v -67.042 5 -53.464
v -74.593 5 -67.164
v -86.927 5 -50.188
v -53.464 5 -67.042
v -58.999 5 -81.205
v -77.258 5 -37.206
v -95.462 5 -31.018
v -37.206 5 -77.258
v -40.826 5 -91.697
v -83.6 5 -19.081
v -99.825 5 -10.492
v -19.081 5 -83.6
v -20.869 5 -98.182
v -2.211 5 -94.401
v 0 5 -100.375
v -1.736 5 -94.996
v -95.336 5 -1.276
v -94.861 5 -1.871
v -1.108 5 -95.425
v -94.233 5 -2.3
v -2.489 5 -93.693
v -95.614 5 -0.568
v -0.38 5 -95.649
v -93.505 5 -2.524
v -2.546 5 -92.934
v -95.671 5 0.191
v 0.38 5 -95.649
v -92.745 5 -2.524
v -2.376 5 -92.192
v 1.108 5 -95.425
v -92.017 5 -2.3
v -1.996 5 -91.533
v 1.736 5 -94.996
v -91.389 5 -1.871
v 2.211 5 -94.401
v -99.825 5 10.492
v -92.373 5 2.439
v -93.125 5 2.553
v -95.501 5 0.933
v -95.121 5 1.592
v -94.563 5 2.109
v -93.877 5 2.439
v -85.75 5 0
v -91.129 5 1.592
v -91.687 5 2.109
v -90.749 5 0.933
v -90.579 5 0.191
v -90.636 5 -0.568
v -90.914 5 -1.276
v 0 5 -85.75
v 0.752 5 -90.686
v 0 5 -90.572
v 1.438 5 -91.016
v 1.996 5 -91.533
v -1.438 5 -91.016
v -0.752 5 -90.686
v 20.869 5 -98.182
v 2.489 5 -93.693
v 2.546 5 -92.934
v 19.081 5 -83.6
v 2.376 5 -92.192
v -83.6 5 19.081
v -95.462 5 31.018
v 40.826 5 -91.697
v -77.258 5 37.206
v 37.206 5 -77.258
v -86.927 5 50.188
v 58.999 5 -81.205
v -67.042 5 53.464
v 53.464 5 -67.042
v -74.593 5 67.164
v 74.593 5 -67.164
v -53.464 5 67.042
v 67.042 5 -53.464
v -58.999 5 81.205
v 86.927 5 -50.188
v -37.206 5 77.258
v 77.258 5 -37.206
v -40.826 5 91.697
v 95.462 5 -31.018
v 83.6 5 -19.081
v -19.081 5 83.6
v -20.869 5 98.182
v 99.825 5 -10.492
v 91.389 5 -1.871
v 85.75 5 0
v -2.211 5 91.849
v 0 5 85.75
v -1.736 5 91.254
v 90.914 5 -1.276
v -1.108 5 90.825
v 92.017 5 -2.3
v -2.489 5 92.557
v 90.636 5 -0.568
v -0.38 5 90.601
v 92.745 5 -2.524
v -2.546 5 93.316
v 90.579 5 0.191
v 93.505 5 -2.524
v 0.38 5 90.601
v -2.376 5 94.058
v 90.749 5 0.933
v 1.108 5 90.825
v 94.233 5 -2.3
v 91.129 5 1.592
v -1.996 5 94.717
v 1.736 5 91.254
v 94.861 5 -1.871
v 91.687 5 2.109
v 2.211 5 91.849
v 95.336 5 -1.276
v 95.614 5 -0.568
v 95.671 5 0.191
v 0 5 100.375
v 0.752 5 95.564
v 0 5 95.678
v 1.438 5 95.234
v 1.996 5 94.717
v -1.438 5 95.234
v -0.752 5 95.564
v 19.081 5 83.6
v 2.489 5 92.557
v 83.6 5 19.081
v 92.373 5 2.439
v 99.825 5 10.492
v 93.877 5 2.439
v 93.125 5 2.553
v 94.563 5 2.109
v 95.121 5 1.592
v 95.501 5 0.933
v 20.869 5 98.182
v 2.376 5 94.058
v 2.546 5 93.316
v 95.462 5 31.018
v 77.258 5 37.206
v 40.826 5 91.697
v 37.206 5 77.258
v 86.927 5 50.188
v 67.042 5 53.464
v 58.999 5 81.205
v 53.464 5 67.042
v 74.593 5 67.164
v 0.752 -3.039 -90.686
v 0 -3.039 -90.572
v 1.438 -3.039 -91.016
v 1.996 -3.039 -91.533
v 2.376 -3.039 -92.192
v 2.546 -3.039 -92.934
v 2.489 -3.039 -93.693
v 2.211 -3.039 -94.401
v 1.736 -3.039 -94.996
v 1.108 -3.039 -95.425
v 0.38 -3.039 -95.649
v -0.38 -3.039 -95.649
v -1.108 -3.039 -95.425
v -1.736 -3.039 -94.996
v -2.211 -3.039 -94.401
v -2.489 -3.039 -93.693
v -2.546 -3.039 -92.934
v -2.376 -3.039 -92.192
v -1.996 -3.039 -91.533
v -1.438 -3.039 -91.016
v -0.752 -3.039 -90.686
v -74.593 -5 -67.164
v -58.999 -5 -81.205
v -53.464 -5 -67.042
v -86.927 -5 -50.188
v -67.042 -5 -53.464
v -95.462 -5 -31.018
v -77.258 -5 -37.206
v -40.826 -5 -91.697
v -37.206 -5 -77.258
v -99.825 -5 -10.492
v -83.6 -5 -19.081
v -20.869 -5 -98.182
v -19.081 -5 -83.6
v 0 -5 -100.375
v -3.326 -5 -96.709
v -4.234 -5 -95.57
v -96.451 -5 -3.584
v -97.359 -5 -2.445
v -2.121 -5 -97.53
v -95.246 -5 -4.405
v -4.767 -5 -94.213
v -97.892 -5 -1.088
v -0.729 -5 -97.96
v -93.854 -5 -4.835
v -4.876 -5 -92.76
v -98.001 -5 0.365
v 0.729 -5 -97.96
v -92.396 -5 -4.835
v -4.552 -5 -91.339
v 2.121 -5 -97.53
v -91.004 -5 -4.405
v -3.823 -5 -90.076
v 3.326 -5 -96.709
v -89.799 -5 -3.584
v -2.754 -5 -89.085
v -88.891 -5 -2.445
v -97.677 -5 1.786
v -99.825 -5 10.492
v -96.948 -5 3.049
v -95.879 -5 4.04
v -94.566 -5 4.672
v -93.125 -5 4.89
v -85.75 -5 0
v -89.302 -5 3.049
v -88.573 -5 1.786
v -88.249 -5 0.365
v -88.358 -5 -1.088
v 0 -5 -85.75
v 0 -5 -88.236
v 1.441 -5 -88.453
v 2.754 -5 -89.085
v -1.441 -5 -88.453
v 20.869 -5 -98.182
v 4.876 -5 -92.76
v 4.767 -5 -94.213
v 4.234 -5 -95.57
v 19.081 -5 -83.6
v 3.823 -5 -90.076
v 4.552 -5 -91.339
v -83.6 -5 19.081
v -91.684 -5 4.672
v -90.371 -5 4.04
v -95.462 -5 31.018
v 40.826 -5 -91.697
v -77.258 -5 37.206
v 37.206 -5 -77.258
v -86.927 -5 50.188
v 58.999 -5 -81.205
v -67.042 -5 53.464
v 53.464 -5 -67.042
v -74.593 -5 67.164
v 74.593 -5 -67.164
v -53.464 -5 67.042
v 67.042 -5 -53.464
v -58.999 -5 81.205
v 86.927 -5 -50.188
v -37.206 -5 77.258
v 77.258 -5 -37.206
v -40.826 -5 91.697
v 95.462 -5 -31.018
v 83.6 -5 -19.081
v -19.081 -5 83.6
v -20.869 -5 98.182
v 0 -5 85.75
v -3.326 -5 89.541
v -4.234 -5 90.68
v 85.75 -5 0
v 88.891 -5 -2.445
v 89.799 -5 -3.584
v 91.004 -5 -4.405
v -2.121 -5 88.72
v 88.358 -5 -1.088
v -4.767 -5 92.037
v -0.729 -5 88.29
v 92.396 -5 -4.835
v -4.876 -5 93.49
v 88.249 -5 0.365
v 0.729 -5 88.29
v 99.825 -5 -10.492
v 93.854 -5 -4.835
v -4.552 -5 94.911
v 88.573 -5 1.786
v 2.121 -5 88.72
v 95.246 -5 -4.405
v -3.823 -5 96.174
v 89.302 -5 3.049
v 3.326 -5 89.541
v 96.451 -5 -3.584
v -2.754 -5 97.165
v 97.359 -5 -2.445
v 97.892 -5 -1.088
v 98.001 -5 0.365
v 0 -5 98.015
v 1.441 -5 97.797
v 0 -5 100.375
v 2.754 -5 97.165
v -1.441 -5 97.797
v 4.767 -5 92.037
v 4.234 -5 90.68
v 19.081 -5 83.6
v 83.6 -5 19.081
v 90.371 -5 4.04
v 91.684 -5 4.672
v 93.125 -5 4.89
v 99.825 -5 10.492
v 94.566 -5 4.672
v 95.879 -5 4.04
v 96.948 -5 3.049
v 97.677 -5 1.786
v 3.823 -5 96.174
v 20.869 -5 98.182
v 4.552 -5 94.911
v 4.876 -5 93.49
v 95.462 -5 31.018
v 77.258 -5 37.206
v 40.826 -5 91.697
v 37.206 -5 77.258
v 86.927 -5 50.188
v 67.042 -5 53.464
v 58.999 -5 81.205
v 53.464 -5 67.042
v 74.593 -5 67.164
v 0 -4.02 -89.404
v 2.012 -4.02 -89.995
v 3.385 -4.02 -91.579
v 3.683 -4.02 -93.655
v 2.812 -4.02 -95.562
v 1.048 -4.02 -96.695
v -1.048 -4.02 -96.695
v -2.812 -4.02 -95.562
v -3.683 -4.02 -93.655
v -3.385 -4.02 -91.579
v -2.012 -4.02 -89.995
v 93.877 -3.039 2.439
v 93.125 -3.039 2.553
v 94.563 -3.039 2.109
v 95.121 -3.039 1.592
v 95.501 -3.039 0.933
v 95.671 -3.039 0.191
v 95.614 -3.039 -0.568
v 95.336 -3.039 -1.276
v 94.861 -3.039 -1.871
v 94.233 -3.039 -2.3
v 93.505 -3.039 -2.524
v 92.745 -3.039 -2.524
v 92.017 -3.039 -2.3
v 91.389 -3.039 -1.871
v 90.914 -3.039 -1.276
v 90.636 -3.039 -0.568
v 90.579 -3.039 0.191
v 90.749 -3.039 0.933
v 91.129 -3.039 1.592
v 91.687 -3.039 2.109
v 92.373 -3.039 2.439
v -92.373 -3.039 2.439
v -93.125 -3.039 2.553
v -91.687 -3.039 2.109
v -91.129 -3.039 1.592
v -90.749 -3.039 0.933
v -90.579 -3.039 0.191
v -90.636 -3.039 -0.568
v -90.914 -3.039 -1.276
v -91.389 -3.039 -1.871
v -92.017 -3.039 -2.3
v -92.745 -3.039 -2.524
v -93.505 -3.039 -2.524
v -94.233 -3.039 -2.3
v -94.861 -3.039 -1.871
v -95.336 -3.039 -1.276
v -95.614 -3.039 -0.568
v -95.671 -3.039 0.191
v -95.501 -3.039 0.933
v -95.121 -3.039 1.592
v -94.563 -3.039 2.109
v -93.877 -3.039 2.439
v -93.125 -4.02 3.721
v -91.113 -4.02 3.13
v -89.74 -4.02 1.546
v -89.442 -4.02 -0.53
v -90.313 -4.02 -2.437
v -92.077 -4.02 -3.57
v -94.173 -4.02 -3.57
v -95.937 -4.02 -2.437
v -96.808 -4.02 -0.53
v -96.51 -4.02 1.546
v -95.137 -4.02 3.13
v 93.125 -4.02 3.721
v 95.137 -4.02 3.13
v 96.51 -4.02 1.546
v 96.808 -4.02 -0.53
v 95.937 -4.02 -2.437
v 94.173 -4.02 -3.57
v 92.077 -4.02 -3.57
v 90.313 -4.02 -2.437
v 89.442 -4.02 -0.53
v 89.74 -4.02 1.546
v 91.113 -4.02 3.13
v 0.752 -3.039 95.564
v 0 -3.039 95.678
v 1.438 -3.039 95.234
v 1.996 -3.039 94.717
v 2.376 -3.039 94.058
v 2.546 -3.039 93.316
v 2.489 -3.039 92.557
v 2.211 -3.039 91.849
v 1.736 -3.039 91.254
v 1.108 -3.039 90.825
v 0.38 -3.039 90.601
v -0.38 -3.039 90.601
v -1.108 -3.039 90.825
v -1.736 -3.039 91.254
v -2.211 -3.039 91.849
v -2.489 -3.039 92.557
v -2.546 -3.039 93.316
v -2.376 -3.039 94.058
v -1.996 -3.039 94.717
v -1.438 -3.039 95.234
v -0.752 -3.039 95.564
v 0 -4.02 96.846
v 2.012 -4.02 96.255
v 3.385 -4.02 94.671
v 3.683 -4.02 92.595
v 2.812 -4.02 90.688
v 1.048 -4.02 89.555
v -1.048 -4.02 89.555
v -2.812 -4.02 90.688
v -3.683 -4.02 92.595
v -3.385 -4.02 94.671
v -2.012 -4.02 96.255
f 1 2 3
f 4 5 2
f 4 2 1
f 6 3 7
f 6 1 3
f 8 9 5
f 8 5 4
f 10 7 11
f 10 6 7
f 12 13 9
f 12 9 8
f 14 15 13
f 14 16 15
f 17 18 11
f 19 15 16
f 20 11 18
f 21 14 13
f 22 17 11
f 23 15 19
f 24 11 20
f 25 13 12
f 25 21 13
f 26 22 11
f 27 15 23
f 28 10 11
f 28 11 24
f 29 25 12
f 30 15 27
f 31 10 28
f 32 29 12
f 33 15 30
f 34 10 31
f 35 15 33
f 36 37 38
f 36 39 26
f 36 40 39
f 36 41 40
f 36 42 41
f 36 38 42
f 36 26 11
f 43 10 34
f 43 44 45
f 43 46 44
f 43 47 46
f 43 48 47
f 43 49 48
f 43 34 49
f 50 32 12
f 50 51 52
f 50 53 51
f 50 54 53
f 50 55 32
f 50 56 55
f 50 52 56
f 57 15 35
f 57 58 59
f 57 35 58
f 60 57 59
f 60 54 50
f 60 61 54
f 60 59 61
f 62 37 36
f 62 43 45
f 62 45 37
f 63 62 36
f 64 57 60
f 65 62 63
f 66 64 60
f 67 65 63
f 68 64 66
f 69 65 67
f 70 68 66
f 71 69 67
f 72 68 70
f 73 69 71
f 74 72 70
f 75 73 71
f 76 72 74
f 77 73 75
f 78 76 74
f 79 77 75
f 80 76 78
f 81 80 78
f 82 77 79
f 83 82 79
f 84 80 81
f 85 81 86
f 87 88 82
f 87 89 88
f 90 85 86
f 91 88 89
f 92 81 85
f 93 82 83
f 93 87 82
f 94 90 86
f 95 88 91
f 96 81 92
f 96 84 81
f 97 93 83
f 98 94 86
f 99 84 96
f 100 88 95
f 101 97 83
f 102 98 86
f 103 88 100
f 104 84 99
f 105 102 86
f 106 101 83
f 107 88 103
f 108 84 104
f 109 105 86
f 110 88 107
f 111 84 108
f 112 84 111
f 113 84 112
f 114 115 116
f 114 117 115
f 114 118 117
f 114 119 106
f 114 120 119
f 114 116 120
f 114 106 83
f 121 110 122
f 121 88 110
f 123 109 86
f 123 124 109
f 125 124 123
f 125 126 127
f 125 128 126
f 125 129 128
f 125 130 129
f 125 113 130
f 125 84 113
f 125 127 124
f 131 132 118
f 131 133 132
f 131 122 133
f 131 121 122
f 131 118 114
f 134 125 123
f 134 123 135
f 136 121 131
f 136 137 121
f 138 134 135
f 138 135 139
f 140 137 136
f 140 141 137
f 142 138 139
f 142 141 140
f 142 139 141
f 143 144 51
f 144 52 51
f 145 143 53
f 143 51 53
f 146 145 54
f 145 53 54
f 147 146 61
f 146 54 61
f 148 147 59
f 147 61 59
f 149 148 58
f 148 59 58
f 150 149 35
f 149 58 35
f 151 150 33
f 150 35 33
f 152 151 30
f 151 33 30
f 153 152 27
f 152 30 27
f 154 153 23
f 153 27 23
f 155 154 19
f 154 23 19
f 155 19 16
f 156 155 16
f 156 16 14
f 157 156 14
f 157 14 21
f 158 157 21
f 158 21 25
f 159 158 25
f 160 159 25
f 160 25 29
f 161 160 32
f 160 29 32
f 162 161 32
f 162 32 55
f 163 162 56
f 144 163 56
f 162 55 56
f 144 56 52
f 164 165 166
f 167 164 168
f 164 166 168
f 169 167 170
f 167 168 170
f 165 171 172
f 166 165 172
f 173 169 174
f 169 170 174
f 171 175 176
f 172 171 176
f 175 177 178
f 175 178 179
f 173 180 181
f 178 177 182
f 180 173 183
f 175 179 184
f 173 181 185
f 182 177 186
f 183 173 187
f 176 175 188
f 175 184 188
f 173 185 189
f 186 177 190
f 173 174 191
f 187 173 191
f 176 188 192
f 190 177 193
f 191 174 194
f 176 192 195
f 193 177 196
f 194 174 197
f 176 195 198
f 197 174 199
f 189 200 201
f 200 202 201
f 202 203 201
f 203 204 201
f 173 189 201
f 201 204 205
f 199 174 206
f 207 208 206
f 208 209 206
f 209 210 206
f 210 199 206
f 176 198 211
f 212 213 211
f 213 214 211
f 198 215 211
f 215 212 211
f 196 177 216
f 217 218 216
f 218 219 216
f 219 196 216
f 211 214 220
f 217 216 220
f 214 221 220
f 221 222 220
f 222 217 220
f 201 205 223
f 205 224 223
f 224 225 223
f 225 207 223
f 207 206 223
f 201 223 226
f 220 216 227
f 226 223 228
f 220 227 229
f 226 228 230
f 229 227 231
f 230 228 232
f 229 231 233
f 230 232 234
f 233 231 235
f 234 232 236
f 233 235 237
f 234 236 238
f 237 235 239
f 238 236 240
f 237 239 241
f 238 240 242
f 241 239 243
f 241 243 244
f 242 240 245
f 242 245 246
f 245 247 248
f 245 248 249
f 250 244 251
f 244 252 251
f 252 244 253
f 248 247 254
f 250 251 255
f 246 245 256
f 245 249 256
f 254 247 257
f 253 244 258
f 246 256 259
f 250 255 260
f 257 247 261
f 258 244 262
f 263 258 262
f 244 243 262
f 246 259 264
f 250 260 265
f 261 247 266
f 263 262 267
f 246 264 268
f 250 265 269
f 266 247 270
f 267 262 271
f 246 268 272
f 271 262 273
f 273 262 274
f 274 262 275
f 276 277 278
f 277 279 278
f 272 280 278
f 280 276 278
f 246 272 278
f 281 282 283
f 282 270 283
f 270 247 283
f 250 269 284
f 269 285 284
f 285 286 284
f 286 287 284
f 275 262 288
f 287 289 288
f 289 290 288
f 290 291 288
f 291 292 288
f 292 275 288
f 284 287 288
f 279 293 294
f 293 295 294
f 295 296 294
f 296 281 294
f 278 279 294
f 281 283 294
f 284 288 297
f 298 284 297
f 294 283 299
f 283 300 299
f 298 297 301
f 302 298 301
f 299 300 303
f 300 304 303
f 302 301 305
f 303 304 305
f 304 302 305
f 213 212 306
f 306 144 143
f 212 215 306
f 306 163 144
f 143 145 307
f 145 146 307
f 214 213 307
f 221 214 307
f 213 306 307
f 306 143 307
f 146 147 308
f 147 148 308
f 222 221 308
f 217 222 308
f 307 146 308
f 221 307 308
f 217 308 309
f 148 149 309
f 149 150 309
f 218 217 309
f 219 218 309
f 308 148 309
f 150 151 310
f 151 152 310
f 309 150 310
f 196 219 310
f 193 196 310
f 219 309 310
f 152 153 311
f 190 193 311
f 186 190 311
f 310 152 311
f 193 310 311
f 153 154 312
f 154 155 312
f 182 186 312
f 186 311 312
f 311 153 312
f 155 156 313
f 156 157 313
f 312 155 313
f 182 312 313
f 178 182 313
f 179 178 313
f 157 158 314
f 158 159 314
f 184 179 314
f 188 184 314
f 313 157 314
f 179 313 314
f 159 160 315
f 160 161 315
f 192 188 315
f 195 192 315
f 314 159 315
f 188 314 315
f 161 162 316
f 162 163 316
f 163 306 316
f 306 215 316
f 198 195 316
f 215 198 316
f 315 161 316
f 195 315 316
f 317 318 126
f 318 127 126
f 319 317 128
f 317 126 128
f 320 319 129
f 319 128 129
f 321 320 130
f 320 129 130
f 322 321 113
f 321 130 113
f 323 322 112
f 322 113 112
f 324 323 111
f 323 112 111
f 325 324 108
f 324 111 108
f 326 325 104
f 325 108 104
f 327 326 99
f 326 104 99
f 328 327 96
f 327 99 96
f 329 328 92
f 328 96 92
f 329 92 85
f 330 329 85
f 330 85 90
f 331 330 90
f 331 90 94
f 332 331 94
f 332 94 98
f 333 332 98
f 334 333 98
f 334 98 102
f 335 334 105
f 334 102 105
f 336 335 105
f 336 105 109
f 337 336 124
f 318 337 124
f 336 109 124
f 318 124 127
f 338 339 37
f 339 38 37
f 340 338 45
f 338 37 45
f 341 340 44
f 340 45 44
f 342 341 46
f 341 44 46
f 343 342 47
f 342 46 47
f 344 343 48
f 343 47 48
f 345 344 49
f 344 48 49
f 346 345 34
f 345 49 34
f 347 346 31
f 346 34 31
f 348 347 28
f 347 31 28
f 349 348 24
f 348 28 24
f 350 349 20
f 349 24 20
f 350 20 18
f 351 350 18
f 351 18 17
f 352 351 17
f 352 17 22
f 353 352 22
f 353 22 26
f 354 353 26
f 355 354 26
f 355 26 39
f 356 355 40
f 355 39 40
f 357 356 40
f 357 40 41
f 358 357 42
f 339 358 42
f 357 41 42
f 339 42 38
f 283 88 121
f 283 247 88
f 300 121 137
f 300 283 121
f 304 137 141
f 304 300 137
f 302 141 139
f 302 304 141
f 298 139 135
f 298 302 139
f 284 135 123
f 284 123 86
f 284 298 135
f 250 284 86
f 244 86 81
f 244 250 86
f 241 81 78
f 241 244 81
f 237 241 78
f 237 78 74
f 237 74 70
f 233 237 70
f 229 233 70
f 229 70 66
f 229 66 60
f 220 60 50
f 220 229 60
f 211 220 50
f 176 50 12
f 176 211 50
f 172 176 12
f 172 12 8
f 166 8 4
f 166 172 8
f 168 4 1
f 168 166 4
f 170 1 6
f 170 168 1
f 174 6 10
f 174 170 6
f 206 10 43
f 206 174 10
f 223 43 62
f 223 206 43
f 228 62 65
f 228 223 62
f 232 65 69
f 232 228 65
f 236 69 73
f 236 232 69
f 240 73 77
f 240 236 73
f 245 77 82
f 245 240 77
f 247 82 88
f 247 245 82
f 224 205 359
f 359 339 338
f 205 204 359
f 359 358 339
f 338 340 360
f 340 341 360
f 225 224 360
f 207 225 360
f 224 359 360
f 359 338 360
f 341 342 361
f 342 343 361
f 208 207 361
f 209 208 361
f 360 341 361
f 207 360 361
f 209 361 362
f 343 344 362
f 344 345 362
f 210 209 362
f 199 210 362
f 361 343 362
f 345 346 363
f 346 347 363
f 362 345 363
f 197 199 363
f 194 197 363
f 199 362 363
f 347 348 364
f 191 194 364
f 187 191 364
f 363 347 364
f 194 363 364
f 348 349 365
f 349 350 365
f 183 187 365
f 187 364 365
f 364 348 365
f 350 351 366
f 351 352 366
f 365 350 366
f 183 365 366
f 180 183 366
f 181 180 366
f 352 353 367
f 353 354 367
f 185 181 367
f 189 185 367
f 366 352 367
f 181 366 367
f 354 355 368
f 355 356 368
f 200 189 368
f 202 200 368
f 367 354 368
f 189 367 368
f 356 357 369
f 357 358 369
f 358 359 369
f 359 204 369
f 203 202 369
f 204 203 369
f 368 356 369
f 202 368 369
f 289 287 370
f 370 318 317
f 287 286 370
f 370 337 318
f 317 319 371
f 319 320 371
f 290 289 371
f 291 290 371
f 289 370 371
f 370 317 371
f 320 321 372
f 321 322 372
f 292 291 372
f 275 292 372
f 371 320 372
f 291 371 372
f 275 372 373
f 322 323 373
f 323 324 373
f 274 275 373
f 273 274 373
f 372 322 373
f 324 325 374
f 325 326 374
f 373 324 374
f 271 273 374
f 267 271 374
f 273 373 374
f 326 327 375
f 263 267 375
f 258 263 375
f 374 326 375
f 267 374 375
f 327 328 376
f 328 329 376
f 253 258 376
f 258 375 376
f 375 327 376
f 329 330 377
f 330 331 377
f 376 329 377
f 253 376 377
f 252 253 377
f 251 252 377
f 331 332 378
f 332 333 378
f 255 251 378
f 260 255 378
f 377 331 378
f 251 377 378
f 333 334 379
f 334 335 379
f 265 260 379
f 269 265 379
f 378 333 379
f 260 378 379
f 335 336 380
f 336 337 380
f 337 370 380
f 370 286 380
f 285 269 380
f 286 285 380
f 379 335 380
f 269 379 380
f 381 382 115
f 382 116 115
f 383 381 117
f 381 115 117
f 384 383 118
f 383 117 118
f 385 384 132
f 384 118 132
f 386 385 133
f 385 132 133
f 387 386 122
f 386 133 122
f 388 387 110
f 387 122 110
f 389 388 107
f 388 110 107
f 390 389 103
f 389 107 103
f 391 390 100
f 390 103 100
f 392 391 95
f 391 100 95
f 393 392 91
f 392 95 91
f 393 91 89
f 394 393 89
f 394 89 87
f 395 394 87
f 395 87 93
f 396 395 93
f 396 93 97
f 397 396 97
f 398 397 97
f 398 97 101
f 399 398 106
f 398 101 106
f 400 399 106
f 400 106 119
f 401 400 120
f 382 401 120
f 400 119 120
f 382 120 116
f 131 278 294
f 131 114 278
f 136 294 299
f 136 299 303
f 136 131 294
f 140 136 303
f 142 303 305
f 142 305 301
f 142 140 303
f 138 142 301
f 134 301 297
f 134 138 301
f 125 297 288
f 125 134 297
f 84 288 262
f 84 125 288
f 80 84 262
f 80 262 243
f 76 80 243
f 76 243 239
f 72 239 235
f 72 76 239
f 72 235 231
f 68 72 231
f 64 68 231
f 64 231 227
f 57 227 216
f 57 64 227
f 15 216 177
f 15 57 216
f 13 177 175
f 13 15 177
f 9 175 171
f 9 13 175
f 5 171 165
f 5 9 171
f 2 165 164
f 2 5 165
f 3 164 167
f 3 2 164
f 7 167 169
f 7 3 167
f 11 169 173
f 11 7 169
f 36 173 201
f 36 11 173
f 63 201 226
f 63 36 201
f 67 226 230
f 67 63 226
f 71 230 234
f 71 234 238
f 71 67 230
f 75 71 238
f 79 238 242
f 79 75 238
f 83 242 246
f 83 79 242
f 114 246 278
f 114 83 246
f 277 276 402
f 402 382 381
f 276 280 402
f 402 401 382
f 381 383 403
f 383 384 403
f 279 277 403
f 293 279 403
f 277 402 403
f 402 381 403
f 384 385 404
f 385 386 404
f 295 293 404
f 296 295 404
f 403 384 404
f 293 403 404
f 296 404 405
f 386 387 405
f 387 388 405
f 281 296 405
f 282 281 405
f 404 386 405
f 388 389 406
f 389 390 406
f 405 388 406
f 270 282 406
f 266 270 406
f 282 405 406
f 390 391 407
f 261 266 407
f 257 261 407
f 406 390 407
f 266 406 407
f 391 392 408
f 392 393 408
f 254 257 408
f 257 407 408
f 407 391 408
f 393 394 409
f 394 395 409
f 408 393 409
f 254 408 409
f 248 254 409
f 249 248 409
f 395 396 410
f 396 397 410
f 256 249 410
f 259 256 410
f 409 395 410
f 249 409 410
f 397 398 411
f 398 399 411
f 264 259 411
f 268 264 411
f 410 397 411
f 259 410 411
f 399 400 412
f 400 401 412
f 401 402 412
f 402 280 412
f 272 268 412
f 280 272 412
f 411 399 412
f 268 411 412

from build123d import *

# Parameters (mm, degrees)
SKETCH1_R                                          = 100.375000037
SKETCH1_R_2                                        = 85.74999995
BOSS_EXTRUDE1_DEPTH                                = 5.000000033
SKETCH2_R                                          = 1.27
CUT_EXTRUDE1_DEPTH                                 = 143.03971721
CIRPATTERN1_COUNT                                  = 4
CSK_FOR_10_FLAT_HEAD_MACHINE_SCREW_100_D           = 5.1054
CSK_FOR_10_FLAT_HEAD_MACHINE_SCREW_100_CSINK_D     = 9.779
CSK_FOR_10_FLAT_HEAD_MACHINE_SCREW_100_CSINK_ANGLE = 100


with BuildPart() as part:
    # Sketch1 → Boss-Extrude1 (new, symmetric)
    with BuildSketch(Plane(origin=(0, 0, 0), x_dir=(1, 0, 0), z_dir=(0, 1, 0))):
        with Locations(Location((0, 0, 0), (0, 0, 270))):
            Circle(SKETCH1_R)
        with Locations(Location((0, 0, 0), (0, 0, 270))):
            Circle(SKETCH1_R_2, mode=Mode.SUBTRACT)
    extrude(amount=BOSS_EXTRUDE1_DEPTH, both=True)

    # Sketch2 → Cut-Extrude1 (cut, symmetric)
    with BuildSketch(Plane(origin=(0, 0, 0), x_dir=(1, 0, 0), z_dir=(0, 1, 0))):
        with Locations(Location((-93.125000059, 0, 0), (0, 0, 270))):
            Circle(SKETCH2_R)
    cut_extrude1 = extrude(amount=CUT_EXTRUDE1_DEPTH, both=True, mode=Mode.SUBTRACT)

    # CirPattern1: Cut-Extrude1 ×4 about axis
    cirpattern1_axis = Axis((0, 0, 0), (0, 1, 0))
    for i in range(1, CIRPATTERN1_COUNT):
        add(cut_extrude1.rotate(cirpattern1_axis, i * 360 / CIRPATTERN1_COUNT), mode=Mode.SUBTRACT)

    # CSK for #10 Flat Head Machine Screw (100)1 (through all)
    with Locations(Plane(origin=(93.125000059, -5.000000033, 0), x_dir=(0, 0, -1), z_dir=(0, -1, 0))):
        with Locations((0, 0), (93.125000059, -93.125000059), (0, -186.250000118), (-93.125000059, -93.125000059)):
            CounterSinkHole(CSK_FOR_10_FLAT_HEAD_MACHINE_SCREW_100_D / 2, CSK_FOR_10_FLAT_HEAD_MACHINE_SCREW_100_CSINK_D / 2, counter_sink_angle=CSK_FOR_10_FLAT_HEAD_MACHINE_SCREW_100_CSINK_ANGLE)


solid = part.part
